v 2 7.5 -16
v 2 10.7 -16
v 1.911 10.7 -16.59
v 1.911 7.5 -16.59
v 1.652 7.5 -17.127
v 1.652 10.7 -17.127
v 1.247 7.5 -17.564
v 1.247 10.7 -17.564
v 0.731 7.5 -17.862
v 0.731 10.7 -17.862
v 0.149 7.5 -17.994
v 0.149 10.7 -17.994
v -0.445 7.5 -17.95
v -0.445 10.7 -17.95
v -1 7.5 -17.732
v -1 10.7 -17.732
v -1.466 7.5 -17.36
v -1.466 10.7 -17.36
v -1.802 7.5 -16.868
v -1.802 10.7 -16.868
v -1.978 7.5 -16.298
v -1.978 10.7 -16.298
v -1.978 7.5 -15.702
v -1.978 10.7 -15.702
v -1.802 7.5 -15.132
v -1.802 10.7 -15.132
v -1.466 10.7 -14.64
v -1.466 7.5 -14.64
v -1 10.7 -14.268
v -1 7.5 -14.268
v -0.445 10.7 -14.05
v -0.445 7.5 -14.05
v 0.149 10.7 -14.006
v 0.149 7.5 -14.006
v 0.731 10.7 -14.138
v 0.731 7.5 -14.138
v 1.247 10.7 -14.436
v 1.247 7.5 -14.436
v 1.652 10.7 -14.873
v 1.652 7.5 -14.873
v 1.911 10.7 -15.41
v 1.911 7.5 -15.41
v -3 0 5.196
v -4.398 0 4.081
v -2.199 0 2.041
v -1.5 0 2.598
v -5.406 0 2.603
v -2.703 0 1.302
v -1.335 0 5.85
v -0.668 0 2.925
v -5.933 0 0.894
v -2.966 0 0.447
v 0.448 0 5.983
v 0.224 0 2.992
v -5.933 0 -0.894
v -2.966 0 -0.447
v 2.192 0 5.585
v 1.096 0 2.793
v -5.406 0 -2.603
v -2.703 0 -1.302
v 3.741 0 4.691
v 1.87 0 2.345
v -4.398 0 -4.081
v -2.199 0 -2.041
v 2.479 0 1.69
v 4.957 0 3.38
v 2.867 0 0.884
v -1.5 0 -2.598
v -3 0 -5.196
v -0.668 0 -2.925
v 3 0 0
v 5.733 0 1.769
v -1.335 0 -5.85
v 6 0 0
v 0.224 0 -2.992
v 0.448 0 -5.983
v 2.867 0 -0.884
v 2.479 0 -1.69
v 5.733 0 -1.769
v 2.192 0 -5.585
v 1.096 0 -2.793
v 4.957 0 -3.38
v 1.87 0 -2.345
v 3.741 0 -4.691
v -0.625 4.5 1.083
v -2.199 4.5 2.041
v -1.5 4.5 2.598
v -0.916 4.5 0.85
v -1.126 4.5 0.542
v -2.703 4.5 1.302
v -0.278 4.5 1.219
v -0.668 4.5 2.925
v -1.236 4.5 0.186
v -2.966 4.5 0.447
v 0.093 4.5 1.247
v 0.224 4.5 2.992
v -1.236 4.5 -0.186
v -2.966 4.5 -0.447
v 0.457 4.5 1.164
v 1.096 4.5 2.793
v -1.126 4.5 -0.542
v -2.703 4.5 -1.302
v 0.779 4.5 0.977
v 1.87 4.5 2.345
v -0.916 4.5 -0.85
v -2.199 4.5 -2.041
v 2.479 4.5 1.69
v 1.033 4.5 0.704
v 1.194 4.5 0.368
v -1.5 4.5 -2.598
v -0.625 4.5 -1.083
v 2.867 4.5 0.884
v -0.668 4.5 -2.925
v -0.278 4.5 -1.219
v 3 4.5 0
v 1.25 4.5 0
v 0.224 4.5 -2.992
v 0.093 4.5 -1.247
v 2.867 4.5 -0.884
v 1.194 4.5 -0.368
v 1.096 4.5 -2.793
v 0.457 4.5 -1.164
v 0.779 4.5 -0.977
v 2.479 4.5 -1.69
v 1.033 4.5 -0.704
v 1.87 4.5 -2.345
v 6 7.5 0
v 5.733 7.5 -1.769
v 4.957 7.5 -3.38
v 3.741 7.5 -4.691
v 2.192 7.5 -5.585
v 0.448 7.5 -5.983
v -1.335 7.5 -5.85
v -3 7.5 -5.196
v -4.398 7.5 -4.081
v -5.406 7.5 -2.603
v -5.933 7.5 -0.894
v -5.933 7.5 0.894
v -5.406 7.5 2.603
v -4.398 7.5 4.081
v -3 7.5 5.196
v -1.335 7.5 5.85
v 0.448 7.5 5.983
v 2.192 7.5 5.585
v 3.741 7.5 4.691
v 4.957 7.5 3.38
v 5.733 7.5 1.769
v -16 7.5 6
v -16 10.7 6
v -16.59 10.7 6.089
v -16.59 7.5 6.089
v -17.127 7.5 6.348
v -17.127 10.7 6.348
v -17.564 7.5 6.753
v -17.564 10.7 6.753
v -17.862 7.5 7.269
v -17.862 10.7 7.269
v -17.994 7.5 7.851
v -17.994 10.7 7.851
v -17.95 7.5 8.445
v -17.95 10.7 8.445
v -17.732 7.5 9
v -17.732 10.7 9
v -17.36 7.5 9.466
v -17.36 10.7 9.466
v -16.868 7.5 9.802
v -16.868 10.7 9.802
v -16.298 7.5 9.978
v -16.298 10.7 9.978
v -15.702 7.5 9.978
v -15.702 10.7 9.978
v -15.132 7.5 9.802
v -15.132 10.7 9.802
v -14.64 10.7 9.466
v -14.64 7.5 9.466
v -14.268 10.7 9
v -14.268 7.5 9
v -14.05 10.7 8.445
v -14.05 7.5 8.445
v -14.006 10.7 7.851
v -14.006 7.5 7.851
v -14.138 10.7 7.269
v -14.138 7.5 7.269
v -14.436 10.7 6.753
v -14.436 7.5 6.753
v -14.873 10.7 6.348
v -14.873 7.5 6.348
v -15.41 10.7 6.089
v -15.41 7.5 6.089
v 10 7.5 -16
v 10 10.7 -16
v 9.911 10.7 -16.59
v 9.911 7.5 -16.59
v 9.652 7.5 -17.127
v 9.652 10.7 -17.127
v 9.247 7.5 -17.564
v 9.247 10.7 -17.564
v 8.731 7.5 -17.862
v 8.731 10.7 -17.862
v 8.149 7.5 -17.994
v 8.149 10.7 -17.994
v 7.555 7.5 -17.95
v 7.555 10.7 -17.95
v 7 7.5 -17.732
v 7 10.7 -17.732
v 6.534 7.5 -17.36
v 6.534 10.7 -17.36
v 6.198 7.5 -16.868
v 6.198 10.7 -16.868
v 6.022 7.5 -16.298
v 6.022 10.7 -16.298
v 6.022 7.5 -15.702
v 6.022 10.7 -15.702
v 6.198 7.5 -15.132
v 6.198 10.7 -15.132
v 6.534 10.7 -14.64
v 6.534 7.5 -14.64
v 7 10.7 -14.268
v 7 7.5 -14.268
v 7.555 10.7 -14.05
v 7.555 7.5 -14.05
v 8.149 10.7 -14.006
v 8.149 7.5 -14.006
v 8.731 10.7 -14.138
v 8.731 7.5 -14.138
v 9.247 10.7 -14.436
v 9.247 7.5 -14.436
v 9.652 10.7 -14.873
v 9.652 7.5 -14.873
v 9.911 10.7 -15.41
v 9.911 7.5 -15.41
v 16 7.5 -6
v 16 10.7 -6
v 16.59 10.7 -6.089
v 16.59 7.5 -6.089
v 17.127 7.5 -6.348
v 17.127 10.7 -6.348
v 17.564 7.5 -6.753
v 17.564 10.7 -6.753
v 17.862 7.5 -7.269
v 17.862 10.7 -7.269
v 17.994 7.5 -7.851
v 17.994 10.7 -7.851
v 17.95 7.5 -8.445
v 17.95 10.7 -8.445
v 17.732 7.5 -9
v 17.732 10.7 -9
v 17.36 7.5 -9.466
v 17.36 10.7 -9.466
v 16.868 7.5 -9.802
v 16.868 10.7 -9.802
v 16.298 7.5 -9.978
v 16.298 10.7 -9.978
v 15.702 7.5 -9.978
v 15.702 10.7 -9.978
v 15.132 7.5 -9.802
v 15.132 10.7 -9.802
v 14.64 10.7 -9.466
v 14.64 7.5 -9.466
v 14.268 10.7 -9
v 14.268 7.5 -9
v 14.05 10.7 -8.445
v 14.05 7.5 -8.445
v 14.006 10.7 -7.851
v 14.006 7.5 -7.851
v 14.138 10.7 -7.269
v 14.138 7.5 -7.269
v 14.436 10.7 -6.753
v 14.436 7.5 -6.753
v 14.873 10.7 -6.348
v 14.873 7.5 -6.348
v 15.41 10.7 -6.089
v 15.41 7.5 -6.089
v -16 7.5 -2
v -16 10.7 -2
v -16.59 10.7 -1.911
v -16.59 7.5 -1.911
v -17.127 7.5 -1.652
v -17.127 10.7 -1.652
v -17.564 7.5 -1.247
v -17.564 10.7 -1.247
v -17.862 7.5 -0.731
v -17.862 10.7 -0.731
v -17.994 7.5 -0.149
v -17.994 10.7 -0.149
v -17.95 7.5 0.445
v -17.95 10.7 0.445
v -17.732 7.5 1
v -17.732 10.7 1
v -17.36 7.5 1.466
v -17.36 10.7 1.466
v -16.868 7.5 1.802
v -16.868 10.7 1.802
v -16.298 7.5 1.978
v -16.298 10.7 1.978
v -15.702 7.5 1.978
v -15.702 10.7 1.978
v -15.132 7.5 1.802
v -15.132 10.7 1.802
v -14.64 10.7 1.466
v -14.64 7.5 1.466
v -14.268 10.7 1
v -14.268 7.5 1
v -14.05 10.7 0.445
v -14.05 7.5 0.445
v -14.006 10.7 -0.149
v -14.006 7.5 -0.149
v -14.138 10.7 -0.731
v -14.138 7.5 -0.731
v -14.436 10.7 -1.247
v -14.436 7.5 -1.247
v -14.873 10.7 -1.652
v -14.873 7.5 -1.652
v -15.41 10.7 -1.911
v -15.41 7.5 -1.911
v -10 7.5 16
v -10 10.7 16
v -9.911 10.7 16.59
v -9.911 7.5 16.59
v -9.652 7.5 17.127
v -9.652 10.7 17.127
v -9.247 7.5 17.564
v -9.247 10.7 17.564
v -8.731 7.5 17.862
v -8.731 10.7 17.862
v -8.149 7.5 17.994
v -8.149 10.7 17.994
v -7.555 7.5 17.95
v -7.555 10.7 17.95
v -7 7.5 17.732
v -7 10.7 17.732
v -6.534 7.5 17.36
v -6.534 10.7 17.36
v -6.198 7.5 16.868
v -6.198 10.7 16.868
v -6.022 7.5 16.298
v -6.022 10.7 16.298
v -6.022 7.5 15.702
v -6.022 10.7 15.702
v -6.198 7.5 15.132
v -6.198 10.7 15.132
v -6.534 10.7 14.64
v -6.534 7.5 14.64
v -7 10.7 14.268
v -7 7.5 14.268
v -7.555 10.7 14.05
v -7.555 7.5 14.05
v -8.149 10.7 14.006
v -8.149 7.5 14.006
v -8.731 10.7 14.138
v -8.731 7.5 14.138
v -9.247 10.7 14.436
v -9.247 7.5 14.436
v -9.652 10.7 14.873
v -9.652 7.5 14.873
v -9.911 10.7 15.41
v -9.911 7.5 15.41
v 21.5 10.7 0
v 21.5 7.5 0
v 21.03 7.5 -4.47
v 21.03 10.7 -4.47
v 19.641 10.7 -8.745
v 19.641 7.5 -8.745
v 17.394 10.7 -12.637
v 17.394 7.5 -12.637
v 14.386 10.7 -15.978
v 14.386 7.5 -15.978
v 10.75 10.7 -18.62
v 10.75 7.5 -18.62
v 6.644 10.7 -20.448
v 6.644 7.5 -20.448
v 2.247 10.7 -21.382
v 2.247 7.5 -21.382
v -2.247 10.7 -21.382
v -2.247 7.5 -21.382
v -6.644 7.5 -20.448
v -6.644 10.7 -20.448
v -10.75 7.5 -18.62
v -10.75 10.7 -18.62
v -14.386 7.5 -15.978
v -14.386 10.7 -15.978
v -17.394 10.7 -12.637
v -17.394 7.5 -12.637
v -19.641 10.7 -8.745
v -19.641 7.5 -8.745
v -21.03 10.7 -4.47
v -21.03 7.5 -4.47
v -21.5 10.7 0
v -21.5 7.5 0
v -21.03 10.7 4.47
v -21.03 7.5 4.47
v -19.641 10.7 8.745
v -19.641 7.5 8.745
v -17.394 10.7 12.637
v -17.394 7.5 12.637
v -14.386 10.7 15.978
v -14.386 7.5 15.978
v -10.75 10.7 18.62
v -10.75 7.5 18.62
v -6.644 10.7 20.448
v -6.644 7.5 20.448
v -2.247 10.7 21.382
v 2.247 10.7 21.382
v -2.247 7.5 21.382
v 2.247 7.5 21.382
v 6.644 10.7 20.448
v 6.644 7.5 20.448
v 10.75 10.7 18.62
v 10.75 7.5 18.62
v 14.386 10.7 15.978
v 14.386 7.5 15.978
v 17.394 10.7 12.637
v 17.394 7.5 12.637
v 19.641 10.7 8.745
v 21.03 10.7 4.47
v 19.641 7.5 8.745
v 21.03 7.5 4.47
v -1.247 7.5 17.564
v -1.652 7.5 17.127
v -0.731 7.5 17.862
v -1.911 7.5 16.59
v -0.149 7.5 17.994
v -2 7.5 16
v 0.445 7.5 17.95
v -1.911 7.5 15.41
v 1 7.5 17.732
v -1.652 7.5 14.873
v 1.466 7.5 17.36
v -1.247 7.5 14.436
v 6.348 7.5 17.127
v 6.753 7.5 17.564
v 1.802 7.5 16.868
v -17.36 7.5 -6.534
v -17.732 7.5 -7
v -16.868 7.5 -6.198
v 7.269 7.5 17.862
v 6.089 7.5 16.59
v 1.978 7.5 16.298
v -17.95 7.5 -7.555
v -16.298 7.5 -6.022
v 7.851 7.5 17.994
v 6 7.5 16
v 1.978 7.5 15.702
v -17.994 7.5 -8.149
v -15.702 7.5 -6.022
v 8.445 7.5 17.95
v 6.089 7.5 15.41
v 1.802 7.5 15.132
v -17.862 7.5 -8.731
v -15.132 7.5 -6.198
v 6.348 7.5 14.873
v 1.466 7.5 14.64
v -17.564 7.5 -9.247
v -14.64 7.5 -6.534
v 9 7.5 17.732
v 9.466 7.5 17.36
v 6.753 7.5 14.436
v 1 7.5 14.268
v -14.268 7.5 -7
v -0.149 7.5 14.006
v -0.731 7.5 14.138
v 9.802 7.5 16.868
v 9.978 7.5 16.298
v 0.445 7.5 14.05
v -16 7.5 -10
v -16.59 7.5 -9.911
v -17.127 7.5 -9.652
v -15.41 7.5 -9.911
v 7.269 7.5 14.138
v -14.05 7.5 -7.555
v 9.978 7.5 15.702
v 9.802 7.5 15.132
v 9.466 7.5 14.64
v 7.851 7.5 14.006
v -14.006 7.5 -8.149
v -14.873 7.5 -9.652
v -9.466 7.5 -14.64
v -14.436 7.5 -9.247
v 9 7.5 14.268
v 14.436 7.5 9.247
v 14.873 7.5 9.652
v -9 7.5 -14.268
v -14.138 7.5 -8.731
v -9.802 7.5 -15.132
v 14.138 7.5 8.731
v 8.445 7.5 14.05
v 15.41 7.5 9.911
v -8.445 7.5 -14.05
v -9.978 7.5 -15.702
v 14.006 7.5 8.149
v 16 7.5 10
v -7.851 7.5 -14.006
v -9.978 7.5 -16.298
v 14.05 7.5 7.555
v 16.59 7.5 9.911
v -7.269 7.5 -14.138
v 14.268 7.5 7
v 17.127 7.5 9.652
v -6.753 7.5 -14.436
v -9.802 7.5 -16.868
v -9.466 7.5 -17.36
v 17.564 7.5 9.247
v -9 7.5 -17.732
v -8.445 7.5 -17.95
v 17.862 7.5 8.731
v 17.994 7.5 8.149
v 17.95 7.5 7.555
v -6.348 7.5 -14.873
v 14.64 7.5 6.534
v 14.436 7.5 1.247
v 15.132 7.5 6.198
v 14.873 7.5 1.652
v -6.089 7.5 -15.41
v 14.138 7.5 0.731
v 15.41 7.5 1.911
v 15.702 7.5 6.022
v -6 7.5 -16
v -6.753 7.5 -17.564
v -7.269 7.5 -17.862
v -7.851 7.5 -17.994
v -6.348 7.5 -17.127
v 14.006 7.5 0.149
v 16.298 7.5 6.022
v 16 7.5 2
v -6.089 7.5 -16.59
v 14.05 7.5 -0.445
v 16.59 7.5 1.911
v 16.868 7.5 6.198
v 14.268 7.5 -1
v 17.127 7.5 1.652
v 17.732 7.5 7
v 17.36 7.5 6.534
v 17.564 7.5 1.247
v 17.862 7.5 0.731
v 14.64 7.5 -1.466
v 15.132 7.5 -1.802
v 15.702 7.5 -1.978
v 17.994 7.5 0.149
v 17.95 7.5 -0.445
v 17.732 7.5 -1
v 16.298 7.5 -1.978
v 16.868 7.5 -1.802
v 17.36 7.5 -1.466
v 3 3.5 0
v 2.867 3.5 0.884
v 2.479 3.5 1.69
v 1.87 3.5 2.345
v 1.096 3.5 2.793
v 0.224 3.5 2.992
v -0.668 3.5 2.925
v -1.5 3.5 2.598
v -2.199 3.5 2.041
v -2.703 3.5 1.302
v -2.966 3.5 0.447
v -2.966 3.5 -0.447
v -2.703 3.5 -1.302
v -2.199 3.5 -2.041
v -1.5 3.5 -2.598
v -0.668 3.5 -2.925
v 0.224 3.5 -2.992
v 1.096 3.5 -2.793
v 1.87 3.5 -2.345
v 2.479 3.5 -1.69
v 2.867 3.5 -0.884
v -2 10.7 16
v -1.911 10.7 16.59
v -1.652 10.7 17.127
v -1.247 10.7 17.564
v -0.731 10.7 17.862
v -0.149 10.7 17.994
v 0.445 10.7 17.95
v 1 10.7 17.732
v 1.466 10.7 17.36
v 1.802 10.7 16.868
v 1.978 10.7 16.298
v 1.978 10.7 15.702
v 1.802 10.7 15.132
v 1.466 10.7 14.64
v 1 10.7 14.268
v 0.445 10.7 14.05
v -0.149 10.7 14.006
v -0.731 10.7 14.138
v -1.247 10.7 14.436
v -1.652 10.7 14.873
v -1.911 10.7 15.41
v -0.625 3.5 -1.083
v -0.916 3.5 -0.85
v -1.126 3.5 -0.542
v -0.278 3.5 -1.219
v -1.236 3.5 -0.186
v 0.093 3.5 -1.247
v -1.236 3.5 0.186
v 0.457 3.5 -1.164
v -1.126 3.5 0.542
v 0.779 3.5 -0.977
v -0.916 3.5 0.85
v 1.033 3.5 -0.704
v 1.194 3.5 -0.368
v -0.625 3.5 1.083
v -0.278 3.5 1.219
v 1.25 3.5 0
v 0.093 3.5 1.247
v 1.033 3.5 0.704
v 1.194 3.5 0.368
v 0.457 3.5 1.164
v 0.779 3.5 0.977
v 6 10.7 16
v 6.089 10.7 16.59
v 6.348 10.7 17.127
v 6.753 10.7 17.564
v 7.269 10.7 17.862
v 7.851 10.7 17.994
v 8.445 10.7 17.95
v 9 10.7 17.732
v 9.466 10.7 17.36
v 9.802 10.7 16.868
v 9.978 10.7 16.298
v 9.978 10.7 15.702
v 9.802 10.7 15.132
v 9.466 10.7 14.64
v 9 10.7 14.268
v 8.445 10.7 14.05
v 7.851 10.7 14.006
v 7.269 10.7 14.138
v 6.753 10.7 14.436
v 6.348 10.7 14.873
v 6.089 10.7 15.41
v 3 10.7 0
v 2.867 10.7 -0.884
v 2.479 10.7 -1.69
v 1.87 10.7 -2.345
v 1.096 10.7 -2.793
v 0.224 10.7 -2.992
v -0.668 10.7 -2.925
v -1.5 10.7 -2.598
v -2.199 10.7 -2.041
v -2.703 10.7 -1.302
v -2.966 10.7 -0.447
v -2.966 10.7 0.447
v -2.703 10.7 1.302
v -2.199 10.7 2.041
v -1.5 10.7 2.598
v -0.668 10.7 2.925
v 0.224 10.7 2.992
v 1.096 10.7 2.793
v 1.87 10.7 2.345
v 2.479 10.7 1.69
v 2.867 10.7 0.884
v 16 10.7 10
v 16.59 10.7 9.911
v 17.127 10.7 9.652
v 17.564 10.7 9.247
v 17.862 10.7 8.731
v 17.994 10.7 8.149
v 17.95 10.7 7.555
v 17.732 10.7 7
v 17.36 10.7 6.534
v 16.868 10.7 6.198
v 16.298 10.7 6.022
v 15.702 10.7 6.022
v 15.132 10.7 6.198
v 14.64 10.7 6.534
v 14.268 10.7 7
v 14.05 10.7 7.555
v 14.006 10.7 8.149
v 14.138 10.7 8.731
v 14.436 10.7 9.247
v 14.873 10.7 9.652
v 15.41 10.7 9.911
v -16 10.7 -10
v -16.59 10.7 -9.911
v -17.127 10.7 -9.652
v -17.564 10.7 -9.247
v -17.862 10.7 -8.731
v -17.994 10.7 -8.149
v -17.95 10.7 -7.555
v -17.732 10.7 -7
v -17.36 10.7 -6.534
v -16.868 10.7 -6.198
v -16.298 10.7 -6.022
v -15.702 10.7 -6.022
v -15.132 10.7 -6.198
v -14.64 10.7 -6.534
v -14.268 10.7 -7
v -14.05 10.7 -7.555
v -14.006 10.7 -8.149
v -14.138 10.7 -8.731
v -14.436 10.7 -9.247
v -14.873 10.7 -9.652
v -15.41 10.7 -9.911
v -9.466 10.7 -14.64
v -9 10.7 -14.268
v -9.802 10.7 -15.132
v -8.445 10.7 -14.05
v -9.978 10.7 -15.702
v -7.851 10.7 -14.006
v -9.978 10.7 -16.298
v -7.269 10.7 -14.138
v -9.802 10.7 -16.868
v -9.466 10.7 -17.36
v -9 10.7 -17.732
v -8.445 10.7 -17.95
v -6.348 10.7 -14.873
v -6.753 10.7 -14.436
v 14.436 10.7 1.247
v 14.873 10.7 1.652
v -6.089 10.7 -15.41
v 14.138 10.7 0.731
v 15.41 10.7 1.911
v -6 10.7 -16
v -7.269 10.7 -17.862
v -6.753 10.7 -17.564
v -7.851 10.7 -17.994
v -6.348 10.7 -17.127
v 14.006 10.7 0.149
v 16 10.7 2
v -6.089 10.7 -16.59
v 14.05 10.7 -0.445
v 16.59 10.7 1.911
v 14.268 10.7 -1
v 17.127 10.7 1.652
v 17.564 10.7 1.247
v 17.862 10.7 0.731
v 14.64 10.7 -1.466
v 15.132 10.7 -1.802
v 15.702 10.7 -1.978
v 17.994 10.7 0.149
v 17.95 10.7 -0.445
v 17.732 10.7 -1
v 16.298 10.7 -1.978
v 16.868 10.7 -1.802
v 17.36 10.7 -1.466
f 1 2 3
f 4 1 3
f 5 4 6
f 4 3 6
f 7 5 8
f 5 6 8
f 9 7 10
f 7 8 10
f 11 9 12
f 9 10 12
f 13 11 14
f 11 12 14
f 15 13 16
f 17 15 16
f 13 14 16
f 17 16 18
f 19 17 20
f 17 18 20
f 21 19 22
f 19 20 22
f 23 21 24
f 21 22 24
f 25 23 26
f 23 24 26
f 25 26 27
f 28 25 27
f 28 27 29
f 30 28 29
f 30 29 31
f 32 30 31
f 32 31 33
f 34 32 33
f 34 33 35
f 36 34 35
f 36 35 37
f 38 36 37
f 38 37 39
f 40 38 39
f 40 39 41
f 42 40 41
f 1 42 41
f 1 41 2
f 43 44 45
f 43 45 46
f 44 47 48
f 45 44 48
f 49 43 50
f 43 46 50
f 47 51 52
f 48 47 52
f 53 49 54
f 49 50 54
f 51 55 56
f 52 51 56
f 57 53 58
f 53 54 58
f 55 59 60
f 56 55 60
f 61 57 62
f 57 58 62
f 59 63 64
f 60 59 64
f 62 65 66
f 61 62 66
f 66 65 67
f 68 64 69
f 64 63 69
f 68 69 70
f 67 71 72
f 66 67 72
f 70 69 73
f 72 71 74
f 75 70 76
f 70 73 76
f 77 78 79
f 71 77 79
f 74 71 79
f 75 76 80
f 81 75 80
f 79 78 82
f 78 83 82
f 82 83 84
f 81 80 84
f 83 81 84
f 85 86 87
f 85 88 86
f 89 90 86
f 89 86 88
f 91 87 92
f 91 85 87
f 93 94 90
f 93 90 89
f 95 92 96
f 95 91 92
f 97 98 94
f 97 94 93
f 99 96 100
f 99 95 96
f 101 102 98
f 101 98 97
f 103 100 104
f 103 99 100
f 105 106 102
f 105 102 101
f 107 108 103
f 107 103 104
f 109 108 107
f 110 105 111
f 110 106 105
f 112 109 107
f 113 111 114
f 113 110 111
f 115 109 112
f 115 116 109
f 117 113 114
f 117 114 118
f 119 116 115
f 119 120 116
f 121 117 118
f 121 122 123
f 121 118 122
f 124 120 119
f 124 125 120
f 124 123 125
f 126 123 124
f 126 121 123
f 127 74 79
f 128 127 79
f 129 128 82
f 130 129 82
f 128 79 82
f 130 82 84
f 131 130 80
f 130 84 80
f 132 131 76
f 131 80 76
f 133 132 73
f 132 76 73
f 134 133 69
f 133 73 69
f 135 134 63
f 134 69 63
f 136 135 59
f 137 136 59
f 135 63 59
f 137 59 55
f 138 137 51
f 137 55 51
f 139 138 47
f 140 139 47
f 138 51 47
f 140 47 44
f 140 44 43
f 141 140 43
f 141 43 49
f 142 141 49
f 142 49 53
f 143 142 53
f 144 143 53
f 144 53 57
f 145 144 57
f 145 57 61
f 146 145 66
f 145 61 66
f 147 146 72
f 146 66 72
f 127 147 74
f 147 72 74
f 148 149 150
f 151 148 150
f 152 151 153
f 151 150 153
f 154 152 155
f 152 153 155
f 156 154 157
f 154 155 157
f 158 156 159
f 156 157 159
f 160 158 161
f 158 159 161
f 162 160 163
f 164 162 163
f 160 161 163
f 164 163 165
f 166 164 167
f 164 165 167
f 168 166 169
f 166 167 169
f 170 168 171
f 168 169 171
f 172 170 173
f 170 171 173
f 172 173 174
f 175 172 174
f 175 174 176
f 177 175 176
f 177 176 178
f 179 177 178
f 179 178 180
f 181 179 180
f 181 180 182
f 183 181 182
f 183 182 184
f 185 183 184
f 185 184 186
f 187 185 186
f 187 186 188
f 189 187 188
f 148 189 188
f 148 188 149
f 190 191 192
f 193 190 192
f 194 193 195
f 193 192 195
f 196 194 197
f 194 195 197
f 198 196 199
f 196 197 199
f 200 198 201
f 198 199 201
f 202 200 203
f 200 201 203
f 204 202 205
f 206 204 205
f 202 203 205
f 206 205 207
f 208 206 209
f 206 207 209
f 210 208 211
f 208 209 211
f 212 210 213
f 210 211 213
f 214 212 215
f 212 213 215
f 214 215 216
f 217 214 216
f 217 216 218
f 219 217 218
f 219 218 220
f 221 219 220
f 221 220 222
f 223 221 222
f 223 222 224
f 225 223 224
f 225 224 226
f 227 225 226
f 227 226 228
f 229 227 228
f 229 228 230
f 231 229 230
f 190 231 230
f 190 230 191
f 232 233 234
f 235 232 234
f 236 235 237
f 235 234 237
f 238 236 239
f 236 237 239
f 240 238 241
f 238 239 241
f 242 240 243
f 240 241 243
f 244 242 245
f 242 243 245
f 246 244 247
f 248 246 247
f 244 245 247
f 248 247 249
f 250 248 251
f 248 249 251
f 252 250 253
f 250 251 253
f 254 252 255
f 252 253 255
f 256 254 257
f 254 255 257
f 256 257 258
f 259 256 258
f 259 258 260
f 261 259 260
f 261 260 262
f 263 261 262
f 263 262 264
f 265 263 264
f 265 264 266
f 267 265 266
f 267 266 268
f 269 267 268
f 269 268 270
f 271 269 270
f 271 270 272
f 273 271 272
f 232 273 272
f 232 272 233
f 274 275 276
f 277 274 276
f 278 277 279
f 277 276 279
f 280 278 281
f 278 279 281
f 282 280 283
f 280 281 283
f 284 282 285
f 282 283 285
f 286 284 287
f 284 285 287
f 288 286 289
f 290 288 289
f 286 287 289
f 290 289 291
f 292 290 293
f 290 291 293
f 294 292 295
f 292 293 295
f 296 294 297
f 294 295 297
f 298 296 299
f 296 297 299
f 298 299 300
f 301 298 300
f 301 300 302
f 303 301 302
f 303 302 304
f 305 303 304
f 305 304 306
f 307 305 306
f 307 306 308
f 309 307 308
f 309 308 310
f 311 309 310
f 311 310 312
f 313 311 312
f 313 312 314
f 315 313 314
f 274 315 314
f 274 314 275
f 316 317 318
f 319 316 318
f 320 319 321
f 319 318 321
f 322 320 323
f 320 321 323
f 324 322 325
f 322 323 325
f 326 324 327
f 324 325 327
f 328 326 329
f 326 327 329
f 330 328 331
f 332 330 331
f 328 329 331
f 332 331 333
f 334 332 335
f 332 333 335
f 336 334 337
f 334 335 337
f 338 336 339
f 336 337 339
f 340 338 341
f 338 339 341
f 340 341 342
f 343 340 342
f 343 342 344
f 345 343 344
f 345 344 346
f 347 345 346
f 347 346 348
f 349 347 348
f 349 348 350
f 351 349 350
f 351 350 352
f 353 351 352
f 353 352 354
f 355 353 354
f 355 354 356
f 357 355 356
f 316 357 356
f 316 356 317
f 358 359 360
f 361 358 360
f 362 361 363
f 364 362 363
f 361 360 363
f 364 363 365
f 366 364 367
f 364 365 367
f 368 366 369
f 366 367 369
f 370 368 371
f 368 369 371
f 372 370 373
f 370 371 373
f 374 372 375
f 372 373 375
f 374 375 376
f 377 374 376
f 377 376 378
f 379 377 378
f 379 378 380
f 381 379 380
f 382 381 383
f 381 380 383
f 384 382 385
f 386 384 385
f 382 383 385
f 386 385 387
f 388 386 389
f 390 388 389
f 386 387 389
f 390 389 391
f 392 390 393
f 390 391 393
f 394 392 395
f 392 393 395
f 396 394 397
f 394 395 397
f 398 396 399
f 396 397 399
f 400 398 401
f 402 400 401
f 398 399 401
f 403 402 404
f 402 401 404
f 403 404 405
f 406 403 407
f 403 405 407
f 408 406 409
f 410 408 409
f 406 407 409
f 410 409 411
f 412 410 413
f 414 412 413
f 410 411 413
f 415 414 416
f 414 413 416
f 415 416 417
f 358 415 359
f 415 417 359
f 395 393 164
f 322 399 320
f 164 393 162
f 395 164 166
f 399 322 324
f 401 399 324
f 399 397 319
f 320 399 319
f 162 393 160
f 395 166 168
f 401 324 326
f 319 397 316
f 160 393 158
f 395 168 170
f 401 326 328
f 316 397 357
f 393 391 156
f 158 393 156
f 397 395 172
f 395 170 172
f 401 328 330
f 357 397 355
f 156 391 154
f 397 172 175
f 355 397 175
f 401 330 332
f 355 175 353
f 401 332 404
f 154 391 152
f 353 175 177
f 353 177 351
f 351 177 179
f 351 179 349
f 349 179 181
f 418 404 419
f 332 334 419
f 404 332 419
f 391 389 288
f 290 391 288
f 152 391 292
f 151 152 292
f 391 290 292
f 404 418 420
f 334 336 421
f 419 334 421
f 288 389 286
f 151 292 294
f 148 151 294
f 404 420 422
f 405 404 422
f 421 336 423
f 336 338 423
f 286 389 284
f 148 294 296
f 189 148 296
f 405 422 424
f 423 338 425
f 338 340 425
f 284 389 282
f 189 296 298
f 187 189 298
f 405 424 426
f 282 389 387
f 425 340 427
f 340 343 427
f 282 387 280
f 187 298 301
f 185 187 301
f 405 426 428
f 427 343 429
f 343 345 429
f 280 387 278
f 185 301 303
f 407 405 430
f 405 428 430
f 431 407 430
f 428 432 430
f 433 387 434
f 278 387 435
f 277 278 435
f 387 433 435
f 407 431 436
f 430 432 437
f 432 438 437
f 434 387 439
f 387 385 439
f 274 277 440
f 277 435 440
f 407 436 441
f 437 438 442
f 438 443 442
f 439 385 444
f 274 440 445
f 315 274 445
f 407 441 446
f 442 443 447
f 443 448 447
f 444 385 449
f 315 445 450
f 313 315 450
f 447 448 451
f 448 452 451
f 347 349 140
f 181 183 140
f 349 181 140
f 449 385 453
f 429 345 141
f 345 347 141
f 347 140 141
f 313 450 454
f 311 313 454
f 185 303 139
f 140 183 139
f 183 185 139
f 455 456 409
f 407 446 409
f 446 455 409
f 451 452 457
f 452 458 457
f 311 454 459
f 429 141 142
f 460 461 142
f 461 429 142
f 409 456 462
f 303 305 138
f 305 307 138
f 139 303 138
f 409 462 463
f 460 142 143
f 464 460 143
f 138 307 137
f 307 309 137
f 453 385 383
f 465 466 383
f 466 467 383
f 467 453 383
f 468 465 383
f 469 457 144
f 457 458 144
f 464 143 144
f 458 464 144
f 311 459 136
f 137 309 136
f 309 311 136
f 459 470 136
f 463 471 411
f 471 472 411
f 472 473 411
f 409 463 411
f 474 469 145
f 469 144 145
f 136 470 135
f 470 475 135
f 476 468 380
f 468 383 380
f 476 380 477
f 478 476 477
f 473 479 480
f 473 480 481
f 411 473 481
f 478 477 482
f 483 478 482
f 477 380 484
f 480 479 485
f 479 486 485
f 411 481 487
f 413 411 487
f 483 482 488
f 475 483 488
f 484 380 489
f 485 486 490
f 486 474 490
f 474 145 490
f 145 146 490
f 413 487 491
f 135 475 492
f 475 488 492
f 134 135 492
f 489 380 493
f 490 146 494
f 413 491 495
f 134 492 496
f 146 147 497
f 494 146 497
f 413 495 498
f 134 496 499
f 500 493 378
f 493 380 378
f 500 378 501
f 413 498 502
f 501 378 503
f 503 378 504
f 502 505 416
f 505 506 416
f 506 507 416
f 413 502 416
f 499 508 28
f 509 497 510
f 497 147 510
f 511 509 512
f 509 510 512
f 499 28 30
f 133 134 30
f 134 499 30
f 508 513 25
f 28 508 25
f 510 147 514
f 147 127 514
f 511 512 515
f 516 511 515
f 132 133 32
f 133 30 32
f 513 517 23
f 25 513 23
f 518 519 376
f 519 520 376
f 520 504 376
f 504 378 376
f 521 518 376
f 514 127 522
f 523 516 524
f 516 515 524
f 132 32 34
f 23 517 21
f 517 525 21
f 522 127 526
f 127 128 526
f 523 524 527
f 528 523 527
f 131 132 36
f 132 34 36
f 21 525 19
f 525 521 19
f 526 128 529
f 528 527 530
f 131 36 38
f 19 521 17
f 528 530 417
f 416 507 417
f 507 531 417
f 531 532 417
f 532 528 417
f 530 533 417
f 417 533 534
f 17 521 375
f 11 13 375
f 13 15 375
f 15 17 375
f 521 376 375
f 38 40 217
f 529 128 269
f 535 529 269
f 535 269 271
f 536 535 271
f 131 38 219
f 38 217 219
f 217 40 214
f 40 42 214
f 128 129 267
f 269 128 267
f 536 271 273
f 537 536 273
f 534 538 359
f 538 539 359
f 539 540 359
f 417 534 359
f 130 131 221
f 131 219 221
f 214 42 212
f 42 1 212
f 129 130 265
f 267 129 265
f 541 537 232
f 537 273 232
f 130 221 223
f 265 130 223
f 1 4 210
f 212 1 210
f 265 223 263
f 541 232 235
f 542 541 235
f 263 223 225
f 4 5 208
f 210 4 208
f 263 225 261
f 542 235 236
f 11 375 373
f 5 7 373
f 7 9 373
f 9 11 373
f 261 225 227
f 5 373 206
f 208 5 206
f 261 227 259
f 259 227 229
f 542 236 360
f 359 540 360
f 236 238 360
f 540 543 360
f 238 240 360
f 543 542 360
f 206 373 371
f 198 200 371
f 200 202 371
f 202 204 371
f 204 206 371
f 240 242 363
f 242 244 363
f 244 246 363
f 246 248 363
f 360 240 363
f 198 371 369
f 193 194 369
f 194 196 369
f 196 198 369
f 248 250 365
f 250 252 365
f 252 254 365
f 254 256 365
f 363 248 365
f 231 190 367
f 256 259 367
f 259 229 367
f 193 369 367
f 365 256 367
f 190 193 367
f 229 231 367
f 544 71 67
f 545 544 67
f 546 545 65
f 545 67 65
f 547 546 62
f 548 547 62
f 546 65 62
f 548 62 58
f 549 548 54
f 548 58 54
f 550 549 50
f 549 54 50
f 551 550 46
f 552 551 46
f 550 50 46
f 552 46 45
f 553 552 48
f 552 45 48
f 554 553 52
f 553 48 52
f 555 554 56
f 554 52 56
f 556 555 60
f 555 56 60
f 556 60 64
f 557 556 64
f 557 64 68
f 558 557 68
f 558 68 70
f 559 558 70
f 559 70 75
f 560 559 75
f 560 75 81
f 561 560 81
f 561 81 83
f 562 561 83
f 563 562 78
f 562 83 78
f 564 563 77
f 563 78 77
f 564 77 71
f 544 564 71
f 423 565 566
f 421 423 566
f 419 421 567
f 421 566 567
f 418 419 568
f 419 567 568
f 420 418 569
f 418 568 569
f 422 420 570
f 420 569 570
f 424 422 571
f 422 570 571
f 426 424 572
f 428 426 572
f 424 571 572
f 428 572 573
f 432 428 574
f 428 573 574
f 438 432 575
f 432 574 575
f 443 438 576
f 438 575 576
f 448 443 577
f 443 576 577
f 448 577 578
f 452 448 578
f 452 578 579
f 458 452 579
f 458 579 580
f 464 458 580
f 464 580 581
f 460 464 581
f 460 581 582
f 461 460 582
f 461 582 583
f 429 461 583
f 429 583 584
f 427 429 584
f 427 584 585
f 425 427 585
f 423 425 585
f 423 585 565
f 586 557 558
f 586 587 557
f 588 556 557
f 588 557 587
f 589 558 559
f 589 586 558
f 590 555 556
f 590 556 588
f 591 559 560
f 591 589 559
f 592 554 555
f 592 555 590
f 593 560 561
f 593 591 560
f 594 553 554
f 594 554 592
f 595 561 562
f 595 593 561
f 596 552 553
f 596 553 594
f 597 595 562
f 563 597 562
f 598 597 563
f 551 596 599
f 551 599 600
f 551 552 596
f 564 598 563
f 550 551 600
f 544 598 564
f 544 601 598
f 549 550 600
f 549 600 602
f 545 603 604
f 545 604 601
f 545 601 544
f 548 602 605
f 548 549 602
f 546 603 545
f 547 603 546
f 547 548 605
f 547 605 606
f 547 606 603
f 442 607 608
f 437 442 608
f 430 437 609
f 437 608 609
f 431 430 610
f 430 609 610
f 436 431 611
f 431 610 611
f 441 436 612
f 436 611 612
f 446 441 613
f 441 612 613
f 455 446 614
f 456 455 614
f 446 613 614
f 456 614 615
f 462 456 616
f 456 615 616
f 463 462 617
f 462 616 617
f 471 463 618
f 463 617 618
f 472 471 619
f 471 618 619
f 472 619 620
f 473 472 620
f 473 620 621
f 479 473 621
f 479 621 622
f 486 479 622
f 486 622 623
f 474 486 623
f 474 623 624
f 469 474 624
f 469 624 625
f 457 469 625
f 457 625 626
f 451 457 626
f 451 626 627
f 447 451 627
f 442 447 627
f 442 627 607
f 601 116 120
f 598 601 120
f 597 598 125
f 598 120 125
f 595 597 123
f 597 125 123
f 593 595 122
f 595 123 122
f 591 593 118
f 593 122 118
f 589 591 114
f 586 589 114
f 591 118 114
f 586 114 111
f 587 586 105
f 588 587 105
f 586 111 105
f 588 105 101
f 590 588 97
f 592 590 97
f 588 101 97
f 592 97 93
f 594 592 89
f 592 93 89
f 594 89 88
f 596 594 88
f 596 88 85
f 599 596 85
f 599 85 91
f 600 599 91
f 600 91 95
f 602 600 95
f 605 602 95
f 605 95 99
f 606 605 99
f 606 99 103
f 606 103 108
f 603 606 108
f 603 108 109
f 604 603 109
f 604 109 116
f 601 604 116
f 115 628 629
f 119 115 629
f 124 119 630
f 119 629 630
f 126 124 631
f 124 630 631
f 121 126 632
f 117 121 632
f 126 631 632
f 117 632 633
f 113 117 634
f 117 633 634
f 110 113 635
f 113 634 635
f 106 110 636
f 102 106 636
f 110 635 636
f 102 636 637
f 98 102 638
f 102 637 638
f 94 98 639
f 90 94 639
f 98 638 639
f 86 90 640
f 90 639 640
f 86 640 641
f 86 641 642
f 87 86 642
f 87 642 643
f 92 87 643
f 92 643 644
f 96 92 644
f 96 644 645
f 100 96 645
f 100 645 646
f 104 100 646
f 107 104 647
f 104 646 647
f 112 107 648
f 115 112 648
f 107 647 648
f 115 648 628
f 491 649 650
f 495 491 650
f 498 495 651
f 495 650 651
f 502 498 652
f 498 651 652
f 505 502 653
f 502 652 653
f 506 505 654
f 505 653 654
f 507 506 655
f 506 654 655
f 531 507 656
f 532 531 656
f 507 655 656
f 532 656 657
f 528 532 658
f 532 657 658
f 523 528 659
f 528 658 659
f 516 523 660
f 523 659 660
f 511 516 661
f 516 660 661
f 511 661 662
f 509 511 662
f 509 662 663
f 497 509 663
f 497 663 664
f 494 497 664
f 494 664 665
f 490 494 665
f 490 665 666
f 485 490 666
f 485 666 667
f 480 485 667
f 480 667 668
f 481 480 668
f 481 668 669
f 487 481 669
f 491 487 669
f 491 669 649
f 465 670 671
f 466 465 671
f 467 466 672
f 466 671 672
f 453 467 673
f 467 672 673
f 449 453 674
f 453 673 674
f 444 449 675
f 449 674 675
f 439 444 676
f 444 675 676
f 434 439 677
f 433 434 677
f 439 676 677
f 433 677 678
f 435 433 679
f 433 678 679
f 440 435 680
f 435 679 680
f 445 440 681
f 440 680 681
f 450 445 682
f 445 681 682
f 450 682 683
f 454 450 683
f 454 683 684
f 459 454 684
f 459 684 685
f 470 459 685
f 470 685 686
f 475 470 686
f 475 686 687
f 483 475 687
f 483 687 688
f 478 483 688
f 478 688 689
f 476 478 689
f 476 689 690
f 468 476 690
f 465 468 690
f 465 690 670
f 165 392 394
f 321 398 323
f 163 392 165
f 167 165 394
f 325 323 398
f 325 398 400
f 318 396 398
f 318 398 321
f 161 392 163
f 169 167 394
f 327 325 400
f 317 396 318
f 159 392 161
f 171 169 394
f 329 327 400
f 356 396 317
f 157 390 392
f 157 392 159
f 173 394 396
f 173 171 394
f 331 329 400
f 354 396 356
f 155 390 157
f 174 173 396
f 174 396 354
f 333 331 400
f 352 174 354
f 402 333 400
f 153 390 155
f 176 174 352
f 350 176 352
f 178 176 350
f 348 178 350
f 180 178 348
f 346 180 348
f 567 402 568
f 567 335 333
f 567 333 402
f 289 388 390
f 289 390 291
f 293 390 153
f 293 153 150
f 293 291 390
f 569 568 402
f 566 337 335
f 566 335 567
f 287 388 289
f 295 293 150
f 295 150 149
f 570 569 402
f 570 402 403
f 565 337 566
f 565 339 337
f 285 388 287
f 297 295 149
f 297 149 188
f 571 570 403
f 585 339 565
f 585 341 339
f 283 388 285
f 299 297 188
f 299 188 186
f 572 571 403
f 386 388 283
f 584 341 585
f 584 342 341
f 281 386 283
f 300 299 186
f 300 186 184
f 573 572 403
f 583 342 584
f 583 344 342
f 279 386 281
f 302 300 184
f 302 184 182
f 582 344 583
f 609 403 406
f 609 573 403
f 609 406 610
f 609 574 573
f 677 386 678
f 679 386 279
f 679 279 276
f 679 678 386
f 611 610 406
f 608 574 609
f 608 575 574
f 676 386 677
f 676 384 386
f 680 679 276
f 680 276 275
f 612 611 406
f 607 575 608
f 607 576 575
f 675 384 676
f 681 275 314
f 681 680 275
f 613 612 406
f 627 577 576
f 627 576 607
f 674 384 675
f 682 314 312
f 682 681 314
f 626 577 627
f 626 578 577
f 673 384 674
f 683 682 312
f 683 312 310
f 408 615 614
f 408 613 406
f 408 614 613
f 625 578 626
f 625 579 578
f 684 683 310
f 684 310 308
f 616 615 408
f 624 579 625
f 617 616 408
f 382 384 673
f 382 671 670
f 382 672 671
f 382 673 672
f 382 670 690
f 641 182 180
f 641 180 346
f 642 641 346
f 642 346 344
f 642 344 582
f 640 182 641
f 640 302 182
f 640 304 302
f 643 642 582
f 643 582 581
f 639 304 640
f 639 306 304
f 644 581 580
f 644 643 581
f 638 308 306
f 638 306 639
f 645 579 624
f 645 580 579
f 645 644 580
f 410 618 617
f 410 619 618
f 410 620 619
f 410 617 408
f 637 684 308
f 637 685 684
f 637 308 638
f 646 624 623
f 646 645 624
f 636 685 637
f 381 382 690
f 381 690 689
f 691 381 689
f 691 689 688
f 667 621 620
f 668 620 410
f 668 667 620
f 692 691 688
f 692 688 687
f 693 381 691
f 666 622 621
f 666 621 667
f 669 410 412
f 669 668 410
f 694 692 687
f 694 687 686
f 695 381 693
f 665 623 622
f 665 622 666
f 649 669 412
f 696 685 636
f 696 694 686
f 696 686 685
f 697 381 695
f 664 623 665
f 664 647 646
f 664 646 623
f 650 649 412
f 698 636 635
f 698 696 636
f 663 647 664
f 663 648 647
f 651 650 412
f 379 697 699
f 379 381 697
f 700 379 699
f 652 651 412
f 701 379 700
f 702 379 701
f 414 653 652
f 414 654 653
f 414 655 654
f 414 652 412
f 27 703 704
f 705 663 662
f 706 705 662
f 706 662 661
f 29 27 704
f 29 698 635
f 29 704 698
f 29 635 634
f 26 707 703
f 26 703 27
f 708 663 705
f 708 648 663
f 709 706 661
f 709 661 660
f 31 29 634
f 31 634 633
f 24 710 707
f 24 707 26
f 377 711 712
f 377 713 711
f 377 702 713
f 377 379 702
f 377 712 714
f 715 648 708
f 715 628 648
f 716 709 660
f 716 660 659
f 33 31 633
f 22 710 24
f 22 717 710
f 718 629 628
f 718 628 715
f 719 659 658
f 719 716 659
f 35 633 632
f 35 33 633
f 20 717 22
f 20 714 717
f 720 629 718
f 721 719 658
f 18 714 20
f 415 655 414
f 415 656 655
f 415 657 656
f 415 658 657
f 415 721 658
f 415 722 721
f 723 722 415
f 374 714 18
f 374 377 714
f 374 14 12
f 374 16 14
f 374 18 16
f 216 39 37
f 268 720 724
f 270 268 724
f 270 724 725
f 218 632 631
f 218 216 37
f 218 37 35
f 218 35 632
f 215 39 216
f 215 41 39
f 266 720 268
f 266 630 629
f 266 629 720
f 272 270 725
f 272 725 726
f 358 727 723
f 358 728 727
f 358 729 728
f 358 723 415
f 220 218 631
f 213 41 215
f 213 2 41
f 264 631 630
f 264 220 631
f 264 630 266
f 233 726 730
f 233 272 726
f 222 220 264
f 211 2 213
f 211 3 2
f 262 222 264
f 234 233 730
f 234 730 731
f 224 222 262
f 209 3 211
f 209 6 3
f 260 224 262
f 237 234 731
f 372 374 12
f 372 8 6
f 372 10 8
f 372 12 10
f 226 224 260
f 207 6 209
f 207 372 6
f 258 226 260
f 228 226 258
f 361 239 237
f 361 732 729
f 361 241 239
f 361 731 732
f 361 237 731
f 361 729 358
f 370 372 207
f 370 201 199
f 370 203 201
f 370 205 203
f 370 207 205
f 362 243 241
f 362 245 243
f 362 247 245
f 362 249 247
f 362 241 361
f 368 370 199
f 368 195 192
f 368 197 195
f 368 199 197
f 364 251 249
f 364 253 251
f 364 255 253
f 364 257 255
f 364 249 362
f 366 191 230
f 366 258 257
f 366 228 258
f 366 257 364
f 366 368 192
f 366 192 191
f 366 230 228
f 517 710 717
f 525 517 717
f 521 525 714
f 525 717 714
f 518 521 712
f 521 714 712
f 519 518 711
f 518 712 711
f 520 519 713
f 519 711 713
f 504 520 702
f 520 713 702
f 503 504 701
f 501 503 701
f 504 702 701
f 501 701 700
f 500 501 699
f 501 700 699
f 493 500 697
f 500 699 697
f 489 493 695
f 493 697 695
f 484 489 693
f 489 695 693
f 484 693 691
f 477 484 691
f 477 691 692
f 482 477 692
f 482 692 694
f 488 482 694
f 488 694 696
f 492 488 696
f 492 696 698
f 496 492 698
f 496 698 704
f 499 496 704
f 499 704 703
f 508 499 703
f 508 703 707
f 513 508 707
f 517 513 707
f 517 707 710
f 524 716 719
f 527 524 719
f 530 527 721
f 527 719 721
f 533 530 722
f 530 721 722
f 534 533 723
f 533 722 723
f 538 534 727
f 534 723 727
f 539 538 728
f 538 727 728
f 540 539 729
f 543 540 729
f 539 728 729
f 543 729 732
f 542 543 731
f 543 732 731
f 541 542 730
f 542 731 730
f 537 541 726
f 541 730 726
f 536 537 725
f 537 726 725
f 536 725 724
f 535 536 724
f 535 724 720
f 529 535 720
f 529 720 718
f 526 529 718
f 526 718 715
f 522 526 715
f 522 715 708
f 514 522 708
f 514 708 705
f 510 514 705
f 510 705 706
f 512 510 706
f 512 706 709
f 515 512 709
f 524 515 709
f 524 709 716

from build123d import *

# Parameters (mm, degrees)
SKETCH1_R           = 6
BOSS_EXTRUDE1_DEPTH = 7.5
SKETCH2_R           = 21.5
BOSS_EXTRUDE2_DEPTH = 3.2
SKETCH3_R           = 2
CUT_EXTRUDE1_DEPTH  = 11.7
SKETCH4_R           = 1.25
CUT_EXTRUDE2_DEPTH  = 11.7
CIRPATTERN1_COUNT   = 4
SKETCH5_R           = 3
CUT_EXTRUDE3_DEPTH  = 6.2
SKETCH6_R           = 3
CUT_EXTRUDE4_DEPTH  = 3.5


with BuildPart() as part:
    # Sketch1 → Boss-Extrude1 (new body)
    with BuildSketch(Plane(origin=(0, 0, 0), x_dir=(1, 0, 0), z_dir=(0, 1, 0))):
        Circle(SKETCH1_R)
    extrude(amount=BOSS_EXTRUDE1_DEPTH)

    # Sketch2 → Boss-Extrude2 (add)
    with BuildSketch(Plane(origin=(0, 7.5, 0), x_dir=(1, 0, 0), z_dir=(0, 1, 0))):
        Circle(SKETCH2_R)
    extrude(amount=BOSS_EXTRUDE2_DEPTH)

    # Sketch3 → Cut-Extrude1 (cut, through all)
    with BuildSketch(Plane(origin=(0, 10.7, 0), x_dir=(1, 0, 0), z_dir=(0, 1, 0))):
        with Locations((0, 16)):
            Circle(SKETCH3_R)
        with Locations((8, 16)):
            Circle(SKETCH3_R)
        with Locations((-8, 16)):
            Circle(SKETCH3_R)
    cut_extrude1 = extrude(amount=-CUT_EXTRUDE1_DEPTH, mode=Mode.SUBTRACT)

    # Sketch4 → Cut-Extrude2 (cut, through all)
    with BuildSketch(Plane(origin=(0, 10.7, 0), x_dir=(1, 0, 0), z_dir=(0, 1, 0))):
        Circle(SKETCH4_R)
    extrude(amount=-CUT_EXTRUDE2_DEPTH, mode=Mode.SUBTRACT)

    # CirPattern1: Cut-Extrude1 ×4 about axis
    cirpattern1_axis = Axis((0, 0, 0), (0, 1, 0))
    for i in range(1, CIRPATTERN1_COUNT):
        add(cut_extrude1.rotate(cirpattern1_axis, i * 360 / CIRPATTERN1_COUNT), mode=Mode.SUBTRACT)

    # Sketch5 → Cut-Extrude3 (cut)
    with BuildSketch(Plane(origin=(0, 10.7, 0), x_dir=(1, 0, 0), z_dir=(0, 1, 0))):
        Circle(SKETCH5_R)
    extrude(amount=-CUT_EXTRUDE3_DEPTH, mode=Mode.SUBTRACT)

    # Sketch6 → Cut-Extrude4 (cut)
    with BuildSketch(Plane.XZ):
        Circle(SKETCH6_R)
    extrude(amount=-CUT_EXTRUDE4_DEPTH, mode=Mode.SUBTRACT)


solid = part.part
